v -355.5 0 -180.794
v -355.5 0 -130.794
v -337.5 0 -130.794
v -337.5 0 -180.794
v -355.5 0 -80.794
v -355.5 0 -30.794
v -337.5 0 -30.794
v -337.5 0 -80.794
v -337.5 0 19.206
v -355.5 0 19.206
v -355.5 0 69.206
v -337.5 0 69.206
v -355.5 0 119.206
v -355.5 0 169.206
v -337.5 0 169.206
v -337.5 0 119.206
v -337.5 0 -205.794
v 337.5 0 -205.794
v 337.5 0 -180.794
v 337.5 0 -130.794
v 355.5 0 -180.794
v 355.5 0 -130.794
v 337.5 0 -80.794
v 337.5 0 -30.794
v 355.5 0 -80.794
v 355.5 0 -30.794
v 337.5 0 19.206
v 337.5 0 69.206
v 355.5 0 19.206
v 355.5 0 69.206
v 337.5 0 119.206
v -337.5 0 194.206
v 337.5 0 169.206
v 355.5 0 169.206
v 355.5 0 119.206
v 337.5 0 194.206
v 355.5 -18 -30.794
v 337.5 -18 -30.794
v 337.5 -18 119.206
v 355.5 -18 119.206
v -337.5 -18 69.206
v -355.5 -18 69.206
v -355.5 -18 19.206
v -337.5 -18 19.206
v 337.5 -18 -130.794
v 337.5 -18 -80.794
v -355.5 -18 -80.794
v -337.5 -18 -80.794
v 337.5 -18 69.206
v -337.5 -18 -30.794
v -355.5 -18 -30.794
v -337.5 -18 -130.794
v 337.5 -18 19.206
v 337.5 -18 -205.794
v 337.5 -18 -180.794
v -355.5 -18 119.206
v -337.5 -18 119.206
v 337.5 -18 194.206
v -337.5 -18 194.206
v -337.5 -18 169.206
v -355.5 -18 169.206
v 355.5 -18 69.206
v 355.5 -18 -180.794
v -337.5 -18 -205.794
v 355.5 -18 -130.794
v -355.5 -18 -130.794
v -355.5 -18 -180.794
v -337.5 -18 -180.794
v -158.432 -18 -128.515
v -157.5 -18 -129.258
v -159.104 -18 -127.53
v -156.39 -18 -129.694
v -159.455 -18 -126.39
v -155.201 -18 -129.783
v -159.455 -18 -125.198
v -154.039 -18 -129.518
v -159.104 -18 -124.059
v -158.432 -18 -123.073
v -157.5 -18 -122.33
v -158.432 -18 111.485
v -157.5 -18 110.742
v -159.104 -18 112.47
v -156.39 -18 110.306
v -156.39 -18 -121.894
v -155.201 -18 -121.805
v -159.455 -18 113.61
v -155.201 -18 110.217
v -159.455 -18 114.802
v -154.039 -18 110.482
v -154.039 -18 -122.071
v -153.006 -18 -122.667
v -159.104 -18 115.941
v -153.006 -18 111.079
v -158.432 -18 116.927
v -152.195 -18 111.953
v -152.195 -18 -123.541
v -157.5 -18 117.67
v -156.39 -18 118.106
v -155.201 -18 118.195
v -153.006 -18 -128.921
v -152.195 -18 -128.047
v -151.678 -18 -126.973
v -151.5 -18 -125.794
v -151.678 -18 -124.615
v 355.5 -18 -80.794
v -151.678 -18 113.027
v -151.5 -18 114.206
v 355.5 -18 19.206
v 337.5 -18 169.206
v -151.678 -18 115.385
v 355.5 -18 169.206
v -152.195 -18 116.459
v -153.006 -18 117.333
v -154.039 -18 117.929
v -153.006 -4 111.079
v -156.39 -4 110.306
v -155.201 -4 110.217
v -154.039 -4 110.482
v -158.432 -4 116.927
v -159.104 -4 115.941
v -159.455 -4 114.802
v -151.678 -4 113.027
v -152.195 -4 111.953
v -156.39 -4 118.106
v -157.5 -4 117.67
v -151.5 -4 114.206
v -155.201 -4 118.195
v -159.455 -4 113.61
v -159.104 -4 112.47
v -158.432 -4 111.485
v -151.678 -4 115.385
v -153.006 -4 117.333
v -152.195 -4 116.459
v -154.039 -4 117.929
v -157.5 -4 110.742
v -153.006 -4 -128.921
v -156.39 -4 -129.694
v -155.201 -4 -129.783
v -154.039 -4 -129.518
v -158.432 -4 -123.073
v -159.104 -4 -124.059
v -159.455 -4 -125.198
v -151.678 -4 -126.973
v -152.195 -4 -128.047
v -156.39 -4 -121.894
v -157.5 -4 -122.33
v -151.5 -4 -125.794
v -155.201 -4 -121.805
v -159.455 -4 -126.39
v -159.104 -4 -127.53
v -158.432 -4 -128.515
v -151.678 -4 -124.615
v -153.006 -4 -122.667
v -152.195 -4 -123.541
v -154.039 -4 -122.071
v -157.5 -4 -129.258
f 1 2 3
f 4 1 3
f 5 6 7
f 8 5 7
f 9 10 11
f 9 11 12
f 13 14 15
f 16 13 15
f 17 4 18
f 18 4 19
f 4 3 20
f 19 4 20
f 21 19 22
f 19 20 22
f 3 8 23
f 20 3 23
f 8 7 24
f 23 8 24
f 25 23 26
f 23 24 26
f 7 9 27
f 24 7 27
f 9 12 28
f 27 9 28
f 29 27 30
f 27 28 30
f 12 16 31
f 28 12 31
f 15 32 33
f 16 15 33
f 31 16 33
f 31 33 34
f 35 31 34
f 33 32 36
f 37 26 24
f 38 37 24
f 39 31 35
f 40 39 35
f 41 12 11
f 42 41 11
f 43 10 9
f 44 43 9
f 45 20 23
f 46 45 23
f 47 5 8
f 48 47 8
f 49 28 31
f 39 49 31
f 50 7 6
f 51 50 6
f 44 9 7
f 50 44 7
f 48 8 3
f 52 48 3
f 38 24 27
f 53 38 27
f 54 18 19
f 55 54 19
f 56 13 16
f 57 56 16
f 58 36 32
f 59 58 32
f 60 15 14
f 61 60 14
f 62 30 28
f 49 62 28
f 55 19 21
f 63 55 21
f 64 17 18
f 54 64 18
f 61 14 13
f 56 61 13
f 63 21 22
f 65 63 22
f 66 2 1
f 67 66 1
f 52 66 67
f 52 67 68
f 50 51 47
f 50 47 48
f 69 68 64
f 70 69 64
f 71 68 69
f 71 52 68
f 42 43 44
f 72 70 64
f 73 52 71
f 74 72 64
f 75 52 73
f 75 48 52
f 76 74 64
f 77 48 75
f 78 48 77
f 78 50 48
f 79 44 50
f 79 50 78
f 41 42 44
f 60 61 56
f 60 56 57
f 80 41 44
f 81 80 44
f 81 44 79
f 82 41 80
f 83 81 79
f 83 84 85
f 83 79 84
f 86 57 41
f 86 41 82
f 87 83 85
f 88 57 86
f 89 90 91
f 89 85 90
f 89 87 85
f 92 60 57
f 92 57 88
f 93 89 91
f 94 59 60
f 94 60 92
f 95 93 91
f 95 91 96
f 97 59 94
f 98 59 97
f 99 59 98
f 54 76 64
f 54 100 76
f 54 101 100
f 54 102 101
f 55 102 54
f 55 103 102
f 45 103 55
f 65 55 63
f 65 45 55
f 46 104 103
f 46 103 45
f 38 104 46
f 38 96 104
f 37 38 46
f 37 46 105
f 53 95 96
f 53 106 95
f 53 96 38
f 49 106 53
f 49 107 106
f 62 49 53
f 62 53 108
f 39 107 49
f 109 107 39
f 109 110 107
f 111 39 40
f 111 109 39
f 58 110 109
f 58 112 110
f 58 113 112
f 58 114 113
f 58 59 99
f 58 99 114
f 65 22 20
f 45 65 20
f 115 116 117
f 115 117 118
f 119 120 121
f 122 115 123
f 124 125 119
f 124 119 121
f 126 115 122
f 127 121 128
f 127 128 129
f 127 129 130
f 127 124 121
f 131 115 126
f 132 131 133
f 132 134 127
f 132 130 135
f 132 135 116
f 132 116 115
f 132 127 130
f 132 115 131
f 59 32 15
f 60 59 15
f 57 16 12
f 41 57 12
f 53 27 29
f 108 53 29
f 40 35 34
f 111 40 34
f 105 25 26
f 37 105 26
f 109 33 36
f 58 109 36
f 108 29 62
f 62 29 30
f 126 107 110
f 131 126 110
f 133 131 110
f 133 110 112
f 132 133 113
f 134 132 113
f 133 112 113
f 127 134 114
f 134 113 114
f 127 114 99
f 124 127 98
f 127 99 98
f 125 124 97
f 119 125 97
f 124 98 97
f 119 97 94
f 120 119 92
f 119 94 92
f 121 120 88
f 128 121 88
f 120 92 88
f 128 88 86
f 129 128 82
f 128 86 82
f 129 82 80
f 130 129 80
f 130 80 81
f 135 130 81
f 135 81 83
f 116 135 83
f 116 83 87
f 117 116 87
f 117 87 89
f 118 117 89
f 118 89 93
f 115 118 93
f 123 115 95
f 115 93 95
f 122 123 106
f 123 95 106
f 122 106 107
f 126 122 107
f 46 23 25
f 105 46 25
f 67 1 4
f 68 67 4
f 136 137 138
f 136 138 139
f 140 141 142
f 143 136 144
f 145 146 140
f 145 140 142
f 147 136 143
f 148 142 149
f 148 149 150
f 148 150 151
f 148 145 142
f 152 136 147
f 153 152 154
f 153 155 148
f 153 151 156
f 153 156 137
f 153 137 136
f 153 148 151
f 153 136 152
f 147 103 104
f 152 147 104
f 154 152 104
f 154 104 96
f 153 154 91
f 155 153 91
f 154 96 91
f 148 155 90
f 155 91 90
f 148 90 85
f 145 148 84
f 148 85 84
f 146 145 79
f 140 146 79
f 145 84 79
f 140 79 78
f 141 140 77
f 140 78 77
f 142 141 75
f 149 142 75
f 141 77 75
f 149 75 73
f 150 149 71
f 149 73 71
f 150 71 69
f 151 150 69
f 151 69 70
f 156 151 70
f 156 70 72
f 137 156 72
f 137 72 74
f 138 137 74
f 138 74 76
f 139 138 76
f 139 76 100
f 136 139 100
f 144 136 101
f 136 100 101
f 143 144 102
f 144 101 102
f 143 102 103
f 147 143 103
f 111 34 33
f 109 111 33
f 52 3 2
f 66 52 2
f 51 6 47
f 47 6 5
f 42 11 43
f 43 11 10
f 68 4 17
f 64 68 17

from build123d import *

# Parameters (mm, degrees)
F1_DEPTH = 18
F2_R     = 4
F3_DEPTH = 14


with BuildPart() as f1:
    # F0 (on Front) → F1 (new body)
    with BuildSketch(Plane.XZ):
        Polygon((337.5, 194.205903), (-337.5, 194.205903), (-337.5, 169.205903), (-355.5, 169.205903), (-355.5, 119.205903), (-337.5, 119.205903), (-337.5, 69.205903), (-355.5, 69.205903), (-355.5, 19.205903), (-337.5, 19.205903), (-337.5, -30.794097), (-355.5, -30.794097), (-355.5, -80.794097), (-337.5, -80.794097), (-337.5, -130.794097), (-355.5, -130.794097), (-355.5, -180.794097), (-337.5, -180.794097), (-337.5, -205.794097), (337.5, -205.794097), (337.5, -180.794097), (355.5, -180.794097), (355.5, -130.794097), (337.5, -130.794097), (337.5, -80.794097), (355.5, -80.794097), (355.5, -30.794097), (337.5, -30.794097), (337.5, 19.205903), (355.5, 19.205903), (355.5, 69.205903), (337.5, 69.205903), (337.5, 119.205903), (355.5, 119.205903), (355.5, 169.205903), (337.5, 169.205903), align=None)
    extrude(amount=F1_DEPTH)

    # F2 (on face) → F3 (cut)
    with BuildSketch(Plane.XZ.offset(18)):
        with Locations((-155.5, -125.794097)):
            Circle(F2_R)
        with Locations((-155.5, 114.205903)):
            Circle(F2_R)
    extrude(amount=-F3_DEPTH, mode=Mode.SUBTRACT)


solid = f1.part
